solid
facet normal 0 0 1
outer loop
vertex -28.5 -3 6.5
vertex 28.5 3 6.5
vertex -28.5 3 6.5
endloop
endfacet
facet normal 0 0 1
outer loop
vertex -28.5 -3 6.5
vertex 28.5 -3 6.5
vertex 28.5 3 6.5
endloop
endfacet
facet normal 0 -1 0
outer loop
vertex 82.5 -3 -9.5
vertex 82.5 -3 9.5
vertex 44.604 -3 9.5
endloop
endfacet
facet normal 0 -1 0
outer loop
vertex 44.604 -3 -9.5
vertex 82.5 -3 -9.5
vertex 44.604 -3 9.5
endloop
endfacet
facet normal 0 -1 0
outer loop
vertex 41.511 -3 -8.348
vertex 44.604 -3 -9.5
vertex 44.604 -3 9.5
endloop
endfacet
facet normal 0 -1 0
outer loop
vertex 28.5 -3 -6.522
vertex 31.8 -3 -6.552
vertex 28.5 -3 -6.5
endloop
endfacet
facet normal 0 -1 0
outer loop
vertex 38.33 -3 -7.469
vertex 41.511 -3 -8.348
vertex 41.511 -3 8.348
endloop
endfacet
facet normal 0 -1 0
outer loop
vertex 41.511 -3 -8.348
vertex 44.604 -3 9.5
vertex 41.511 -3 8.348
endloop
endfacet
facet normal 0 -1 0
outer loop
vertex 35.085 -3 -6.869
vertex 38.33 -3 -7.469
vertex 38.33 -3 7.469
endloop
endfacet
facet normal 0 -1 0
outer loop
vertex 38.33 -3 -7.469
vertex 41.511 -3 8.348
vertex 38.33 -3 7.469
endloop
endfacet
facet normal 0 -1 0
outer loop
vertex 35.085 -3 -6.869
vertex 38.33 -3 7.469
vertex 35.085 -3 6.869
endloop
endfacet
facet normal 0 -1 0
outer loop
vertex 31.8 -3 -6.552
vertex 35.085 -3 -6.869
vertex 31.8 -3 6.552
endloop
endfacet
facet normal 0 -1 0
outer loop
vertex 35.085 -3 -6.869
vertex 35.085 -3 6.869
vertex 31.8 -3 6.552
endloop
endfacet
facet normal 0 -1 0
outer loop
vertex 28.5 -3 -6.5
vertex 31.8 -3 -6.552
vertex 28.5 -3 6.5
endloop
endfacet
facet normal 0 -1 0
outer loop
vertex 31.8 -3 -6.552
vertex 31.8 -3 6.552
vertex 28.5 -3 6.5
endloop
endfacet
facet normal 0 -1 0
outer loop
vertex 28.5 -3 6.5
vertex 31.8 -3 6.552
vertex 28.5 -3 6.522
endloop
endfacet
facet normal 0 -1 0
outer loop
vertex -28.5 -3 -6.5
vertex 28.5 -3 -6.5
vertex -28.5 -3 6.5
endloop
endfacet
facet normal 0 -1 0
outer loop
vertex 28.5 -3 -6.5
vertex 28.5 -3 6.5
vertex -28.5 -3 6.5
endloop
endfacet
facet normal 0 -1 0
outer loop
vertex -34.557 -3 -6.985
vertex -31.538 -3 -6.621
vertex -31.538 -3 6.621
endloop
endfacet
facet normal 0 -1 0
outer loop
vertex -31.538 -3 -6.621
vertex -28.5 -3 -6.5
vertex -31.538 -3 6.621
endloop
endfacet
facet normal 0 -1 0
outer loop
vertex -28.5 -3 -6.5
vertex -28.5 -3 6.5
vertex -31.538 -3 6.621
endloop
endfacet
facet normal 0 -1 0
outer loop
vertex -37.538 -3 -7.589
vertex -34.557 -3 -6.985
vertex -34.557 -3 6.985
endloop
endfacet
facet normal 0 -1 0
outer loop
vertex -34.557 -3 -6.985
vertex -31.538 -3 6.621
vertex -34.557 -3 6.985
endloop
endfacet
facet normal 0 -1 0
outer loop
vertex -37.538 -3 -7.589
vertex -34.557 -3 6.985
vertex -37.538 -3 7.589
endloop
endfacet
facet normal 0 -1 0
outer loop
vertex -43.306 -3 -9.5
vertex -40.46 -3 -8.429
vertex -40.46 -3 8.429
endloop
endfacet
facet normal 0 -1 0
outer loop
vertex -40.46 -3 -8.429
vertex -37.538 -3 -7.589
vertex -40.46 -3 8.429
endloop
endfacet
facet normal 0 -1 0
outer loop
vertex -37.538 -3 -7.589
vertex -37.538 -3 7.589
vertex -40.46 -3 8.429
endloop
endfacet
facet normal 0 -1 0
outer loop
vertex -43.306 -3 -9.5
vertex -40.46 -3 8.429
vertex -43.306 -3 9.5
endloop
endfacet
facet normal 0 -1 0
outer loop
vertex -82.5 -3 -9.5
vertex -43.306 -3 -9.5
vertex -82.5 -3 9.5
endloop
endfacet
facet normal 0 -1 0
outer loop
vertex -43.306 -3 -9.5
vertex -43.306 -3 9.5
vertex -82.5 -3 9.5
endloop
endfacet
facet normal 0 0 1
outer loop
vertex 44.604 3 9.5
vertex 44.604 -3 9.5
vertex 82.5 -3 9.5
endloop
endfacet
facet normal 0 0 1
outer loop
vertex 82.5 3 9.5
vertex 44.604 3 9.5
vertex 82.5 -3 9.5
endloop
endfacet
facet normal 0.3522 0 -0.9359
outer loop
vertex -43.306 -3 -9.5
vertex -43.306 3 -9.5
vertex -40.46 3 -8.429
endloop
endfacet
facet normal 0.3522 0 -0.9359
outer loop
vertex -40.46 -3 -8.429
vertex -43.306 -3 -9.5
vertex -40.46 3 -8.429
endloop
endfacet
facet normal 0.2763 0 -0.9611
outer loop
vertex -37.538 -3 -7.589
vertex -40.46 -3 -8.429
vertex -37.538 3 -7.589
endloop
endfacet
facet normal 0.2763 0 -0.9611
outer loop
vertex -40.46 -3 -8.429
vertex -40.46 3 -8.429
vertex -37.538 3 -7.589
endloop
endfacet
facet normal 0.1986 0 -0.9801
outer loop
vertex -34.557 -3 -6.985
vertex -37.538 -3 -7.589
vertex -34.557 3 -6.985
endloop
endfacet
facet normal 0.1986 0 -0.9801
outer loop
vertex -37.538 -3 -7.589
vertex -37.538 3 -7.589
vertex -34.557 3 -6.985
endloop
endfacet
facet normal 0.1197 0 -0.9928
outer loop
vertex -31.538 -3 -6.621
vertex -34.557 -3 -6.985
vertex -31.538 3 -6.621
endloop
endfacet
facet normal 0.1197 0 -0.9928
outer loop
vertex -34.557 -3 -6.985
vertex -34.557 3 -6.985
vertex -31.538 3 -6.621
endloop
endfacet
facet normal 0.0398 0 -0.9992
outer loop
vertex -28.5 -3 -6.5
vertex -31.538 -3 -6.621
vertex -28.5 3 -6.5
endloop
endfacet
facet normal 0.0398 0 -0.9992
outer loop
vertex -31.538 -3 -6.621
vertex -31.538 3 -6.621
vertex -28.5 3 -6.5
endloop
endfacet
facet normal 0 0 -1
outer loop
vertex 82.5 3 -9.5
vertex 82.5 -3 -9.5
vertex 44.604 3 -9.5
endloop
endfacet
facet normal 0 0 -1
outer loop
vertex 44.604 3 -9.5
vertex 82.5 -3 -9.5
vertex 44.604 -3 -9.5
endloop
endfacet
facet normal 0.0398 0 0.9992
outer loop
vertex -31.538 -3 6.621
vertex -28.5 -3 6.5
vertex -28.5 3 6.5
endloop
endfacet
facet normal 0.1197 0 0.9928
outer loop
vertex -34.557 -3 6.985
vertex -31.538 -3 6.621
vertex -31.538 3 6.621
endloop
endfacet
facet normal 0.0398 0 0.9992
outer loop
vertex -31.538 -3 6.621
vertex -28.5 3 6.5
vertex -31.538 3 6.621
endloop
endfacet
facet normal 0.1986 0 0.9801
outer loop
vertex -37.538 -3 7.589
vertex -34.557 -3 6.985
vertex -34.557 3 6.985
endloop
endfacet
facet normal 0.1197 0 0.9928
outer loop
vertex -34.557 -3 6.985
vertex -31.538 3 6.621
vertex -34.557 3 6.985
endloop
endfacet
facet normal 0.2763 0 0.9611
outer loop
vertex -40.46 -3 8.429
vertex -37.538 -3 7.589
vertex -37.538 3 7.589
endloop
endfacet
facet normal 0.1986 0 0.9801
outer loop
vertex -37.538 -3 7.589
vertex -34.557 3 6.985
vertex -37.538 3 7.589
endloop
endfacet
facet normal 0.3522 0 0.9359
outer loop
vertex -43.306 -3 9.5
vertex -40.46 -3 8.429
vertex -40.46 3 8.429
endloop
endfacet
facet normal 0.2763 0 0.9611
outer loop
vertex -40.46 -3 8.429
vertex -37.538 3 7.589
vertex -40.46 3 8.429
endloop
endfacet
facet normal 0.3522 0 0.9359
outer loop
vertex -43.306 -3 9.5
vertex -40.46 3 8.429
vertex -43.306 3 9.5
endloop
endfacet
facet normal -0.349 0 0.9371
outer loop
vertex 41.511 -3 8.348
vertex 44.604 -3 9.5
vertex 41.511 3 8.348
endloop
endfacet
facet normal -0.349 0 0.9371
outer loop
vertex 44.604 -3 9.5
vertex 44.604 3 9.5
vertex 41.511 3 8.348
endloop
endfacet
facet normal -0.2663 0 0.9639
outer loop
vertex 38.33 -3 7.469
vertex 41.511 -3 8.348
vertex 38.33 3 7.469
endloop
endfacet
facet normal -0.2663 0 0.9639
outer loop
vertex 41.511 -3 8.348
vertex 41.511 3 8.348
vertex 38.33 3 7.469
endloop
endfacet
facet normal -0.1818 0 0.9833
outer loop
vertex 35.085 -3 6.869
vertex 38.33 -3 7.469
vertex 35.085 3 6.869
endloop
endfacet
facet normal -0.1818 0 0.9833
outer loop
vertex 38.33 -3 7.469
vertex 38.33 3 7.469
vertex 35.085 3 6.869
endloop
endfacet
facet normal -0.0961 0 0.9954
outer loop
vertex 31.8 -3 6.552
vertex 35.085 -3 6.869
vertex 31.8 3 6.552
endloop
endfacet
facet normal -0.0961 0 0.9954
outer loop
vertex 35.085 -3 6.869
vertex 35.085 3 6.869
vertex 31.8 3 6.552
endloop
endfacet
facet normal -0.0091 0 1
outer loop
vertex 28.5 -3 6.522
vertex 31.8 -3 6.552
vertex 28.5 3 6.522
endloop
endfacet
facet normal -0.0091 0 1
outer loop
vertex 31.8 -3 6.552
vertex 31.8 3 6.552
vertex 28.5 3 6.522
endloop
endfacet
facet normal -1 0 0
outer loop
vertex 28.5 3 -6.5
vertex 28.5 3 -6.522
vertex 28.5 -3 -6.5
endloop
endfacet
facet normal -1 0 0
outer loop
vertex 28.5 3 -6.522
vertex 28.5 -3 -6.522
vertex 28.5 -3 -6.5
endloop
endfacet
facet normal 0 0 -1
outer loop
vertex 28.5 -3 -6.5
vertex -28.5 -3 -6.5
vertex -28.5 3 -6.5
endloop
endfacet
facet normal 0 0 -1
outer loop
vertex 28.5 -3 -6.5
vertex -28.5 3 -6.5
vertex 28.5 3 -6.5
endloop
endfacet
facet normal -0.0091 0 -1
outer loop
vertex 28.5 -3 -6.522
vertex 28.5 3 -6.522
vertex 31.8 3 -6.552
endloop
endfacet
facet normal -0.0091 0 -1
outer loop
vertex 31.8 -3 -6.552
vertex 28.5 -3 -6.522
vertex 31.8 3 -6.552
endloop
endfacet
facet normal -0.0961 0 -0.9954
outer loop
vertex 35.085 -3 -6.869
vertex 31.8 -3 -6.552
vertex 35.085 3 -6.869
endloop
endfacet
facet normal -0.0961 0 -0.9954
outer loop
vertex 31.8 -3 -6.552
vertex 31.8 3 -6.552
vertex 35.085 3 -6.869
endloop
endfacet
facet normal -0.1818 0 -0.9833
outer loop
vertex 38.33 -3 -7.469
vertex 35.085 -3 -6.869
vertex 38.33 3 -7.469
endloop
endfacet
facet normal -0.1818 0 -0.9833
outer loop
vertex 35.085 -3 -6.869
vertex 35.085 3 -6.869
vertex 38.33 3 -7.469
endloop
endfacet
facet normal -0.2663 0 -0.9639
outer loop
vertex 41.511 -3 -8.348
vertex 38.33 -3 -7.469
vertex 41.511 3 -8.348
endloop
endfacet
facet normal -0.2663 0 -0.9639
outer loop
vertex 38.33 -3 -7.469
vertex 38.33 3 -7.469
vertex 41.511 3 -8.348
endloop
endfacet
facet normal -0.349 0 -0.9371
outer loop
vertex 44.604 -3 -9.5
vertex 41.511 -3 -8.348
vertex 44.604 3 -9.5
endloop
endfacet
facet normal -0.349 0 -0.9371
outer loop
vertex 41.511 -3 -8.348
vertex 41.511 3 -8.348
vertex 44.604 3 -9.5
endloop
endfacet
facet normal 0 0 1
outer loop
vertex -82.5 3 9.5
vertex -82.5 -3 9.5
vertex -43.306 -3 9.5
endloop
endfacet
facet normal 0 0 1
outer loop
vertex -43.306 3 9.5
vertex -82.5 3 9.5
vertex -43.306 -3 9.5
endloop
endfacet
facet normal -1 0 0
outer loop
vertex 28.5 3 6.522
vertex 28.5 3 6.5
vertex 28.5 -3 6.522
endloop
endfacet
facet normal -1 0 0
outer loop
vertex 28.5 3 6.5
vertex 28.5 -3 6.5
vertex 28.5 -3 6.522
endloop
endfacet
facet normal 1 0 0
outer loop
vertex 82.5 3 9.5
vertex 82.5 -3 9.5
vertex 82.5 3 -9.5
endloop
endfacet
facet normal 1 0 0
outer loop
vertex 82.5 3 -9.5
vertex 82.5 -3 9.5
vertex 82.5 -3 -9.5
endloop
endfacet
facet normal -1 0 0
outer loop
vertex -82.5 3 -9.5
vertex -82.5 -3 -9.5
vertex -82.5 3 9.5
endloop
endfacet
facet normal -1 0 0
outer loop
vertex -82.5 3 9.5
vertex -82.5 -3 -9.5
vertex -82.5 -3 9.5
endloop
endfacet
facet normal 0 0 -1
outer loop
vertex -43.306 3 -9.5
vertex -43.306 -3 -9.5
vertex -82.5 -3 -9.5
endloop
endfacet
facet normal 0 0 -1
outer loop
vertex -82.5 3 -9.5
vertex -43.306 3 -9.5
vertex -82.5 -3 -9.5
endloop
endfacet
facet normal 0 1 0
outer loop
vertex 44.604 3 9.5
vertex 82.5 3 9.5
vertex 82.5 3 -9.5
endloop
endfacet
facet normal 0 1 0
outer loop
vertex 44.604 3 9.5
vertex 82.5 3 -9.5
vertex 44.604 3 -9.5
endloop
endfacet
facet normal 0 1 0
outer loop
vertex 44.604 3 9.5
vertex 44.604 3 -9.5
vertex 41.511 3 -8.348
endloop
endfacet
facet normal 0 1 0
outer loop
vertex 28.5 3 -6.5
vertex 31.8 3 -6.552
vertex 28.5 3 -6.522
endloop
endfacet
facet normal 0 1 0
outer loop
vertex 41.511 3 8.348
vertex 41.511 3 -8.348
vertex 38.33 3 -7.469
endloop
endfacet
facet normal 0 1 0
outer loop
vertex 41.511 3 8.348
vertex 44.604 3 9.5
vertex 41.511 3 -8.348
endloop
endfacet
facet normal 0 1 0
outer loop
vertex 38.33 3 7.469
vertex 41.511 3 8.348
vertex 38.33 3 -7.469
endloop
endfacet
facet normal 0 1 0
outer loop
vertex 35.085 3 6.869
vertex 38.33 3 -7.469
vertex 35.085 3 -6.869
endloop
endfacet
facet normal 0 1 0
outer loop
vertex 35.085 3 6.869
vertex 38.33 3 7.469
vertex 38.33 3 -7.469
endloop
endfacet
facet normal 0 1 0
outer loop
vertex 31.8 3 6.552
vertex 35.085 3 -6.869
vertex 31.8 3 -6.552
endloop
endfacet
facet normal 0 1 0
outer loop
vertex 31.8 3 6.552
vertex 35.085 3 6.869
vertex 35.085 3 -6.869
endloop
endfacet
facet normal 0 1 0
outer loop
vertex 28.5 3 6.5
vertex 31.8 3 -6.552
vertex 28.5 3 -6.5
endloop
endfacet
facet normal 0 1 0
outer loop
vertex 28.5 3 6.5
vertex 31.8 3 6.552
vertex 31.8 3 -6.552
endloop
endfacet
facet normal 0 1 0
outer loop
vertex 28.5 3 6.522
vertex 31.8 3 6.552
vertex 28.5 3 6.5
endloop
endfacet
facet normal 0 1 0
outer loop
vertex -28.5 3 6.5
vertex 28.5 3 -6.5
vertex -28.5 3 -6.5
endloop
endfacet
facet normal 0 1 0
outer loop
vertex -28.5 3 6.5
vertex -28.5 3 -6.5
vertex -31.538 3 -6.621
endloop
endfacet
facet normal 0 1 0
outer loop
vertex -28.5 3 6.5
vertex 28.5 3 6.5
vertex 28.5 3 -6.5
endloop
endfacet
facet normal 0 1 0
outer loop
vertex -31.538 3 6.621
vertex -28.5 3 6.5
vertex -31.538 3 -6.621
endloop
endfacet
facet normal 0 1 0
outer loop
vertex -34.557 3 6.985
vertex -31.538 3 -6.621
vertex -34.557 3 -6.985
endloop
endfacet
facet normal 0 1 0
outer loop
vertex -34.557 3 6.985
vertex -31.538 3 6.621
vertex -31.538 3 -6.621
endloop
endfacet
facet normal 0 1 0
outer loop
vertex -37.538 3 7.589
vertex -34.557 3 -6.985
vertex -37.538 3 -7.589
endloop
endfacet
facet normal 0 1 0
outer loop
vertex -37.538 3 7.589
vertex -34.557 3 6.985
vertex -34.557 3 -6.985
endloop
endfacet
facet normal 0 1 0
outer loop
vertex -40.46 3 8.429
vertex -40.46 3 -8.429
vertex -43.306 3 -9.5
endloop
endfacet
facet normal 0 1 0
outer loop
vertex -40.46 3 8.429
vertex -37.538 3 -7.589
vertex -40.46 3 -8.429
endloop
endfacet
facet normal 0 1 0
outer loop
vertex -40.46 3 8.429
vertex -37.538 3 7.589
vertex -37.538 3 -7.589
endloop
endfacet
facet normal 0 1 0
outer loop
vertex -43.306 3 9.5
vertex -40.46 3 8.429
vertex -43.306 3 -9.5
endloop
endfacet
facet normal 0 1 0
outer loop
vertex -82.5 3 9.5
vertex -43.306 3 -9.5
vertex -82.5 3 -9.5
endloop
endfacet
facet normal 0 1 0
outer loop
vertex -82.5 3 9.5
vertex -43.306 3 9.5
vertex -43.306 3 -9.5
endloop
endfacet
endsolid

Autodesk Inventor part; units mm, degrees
ref_plane "YZ Plane" through (0, 0, 0) normal (1, 0, 0) x (0, 1, 0)
ref_plane "XZ Plane" through (0, 0, 0) normal (0, 1, 0) x (-1, 0, 0)
ref_plane "XY Plane" through (0, 0, 0) normal (0, 0, 1) x (1, 0, 0)
sketch "Boceto1" plane through (0, 0, 0) normal (0, 1, 0) x (-1, 0, 0)
  line L0 (-28.5, 6.5) -> (28.5, 6.5)
  line L1 (28.5, 6.5) -> (28.5, -6.5)
  line L2 (28.5, -6.5) -> (-28.5, -6.5)
  line L3 (-28.5, -6.5) -> (-28.5, 6.5)
  line L4 (-28.5, 6.5) -> (28.5, -6.5) construction
  line L5 (28.5, 6.5) -> (-28.5, -6.5) construction
  line L6 (82.5, 9.5) -> (28.5, 9.5)
  line L7 (28.5, 9.5) -> (28.5, -9.5)
  line L8 (28.5, -9.5) -> (82.5, -9.5)
  line L9 (82.5, -9.5) -> (82.5, 9.5)
  line L10 (-28.5, 9.5) -> (-82.5, 9.5)
  line L11 (-82.5, 9.5) -> (-82.5, -9.5)
  line L12 (-82.5, -9.5) -> (-28.5, -9.5)
  line L13 (-28.5, -9.5) -> (-28.5, 9.5)
  point P0 (0, 0)
  point P1 (28.5, 6.5)
  point P2 (-28.5, 6.5)
  point P3 (28.5, -6.5)
  dimension "d0" = 13
  dimension "d1" = 57
  dimension "d2" = 19
  dimension "d3" = 9.5
  dimension "d4" = 9.5
  dimension "d5" = 19
  dimension "d6" = 165
extrude "Extrusión1" add sketch "Boceto1" along normal mid plane 6
sketch "Boceto3" plane through (0, 3, 0) normal (0, 1, 0) x (1, 0, 0)
  circle A0 centre (-28.5074, -44.5) radius 38
  line L0 (-28.5, -6.5) -> (28.5, -6.5) projected
  circle A1 centre (-28.5074, 44.5) radius 38
  circle A2 centre (29.8049, 44.5) radius 38
  circle A3 centre (29.8049, -44.5) radius 38
  line L1 (28.5, 6.5) -> (-28.5, 6.5) projected
  point P0 (0, 0)
  point P1 (0.6488, -68.8704)
  point P2 (0.6488, -20.1296)
  point P3 (0.6488, 68.8704)
  point P4 (0.6488, 20.1296)
  dimension "d11" = 76
extrude "Extrusión2" cut sketch "Boceto3" against normal through all
properties part number "TensileTestSpecimen"
